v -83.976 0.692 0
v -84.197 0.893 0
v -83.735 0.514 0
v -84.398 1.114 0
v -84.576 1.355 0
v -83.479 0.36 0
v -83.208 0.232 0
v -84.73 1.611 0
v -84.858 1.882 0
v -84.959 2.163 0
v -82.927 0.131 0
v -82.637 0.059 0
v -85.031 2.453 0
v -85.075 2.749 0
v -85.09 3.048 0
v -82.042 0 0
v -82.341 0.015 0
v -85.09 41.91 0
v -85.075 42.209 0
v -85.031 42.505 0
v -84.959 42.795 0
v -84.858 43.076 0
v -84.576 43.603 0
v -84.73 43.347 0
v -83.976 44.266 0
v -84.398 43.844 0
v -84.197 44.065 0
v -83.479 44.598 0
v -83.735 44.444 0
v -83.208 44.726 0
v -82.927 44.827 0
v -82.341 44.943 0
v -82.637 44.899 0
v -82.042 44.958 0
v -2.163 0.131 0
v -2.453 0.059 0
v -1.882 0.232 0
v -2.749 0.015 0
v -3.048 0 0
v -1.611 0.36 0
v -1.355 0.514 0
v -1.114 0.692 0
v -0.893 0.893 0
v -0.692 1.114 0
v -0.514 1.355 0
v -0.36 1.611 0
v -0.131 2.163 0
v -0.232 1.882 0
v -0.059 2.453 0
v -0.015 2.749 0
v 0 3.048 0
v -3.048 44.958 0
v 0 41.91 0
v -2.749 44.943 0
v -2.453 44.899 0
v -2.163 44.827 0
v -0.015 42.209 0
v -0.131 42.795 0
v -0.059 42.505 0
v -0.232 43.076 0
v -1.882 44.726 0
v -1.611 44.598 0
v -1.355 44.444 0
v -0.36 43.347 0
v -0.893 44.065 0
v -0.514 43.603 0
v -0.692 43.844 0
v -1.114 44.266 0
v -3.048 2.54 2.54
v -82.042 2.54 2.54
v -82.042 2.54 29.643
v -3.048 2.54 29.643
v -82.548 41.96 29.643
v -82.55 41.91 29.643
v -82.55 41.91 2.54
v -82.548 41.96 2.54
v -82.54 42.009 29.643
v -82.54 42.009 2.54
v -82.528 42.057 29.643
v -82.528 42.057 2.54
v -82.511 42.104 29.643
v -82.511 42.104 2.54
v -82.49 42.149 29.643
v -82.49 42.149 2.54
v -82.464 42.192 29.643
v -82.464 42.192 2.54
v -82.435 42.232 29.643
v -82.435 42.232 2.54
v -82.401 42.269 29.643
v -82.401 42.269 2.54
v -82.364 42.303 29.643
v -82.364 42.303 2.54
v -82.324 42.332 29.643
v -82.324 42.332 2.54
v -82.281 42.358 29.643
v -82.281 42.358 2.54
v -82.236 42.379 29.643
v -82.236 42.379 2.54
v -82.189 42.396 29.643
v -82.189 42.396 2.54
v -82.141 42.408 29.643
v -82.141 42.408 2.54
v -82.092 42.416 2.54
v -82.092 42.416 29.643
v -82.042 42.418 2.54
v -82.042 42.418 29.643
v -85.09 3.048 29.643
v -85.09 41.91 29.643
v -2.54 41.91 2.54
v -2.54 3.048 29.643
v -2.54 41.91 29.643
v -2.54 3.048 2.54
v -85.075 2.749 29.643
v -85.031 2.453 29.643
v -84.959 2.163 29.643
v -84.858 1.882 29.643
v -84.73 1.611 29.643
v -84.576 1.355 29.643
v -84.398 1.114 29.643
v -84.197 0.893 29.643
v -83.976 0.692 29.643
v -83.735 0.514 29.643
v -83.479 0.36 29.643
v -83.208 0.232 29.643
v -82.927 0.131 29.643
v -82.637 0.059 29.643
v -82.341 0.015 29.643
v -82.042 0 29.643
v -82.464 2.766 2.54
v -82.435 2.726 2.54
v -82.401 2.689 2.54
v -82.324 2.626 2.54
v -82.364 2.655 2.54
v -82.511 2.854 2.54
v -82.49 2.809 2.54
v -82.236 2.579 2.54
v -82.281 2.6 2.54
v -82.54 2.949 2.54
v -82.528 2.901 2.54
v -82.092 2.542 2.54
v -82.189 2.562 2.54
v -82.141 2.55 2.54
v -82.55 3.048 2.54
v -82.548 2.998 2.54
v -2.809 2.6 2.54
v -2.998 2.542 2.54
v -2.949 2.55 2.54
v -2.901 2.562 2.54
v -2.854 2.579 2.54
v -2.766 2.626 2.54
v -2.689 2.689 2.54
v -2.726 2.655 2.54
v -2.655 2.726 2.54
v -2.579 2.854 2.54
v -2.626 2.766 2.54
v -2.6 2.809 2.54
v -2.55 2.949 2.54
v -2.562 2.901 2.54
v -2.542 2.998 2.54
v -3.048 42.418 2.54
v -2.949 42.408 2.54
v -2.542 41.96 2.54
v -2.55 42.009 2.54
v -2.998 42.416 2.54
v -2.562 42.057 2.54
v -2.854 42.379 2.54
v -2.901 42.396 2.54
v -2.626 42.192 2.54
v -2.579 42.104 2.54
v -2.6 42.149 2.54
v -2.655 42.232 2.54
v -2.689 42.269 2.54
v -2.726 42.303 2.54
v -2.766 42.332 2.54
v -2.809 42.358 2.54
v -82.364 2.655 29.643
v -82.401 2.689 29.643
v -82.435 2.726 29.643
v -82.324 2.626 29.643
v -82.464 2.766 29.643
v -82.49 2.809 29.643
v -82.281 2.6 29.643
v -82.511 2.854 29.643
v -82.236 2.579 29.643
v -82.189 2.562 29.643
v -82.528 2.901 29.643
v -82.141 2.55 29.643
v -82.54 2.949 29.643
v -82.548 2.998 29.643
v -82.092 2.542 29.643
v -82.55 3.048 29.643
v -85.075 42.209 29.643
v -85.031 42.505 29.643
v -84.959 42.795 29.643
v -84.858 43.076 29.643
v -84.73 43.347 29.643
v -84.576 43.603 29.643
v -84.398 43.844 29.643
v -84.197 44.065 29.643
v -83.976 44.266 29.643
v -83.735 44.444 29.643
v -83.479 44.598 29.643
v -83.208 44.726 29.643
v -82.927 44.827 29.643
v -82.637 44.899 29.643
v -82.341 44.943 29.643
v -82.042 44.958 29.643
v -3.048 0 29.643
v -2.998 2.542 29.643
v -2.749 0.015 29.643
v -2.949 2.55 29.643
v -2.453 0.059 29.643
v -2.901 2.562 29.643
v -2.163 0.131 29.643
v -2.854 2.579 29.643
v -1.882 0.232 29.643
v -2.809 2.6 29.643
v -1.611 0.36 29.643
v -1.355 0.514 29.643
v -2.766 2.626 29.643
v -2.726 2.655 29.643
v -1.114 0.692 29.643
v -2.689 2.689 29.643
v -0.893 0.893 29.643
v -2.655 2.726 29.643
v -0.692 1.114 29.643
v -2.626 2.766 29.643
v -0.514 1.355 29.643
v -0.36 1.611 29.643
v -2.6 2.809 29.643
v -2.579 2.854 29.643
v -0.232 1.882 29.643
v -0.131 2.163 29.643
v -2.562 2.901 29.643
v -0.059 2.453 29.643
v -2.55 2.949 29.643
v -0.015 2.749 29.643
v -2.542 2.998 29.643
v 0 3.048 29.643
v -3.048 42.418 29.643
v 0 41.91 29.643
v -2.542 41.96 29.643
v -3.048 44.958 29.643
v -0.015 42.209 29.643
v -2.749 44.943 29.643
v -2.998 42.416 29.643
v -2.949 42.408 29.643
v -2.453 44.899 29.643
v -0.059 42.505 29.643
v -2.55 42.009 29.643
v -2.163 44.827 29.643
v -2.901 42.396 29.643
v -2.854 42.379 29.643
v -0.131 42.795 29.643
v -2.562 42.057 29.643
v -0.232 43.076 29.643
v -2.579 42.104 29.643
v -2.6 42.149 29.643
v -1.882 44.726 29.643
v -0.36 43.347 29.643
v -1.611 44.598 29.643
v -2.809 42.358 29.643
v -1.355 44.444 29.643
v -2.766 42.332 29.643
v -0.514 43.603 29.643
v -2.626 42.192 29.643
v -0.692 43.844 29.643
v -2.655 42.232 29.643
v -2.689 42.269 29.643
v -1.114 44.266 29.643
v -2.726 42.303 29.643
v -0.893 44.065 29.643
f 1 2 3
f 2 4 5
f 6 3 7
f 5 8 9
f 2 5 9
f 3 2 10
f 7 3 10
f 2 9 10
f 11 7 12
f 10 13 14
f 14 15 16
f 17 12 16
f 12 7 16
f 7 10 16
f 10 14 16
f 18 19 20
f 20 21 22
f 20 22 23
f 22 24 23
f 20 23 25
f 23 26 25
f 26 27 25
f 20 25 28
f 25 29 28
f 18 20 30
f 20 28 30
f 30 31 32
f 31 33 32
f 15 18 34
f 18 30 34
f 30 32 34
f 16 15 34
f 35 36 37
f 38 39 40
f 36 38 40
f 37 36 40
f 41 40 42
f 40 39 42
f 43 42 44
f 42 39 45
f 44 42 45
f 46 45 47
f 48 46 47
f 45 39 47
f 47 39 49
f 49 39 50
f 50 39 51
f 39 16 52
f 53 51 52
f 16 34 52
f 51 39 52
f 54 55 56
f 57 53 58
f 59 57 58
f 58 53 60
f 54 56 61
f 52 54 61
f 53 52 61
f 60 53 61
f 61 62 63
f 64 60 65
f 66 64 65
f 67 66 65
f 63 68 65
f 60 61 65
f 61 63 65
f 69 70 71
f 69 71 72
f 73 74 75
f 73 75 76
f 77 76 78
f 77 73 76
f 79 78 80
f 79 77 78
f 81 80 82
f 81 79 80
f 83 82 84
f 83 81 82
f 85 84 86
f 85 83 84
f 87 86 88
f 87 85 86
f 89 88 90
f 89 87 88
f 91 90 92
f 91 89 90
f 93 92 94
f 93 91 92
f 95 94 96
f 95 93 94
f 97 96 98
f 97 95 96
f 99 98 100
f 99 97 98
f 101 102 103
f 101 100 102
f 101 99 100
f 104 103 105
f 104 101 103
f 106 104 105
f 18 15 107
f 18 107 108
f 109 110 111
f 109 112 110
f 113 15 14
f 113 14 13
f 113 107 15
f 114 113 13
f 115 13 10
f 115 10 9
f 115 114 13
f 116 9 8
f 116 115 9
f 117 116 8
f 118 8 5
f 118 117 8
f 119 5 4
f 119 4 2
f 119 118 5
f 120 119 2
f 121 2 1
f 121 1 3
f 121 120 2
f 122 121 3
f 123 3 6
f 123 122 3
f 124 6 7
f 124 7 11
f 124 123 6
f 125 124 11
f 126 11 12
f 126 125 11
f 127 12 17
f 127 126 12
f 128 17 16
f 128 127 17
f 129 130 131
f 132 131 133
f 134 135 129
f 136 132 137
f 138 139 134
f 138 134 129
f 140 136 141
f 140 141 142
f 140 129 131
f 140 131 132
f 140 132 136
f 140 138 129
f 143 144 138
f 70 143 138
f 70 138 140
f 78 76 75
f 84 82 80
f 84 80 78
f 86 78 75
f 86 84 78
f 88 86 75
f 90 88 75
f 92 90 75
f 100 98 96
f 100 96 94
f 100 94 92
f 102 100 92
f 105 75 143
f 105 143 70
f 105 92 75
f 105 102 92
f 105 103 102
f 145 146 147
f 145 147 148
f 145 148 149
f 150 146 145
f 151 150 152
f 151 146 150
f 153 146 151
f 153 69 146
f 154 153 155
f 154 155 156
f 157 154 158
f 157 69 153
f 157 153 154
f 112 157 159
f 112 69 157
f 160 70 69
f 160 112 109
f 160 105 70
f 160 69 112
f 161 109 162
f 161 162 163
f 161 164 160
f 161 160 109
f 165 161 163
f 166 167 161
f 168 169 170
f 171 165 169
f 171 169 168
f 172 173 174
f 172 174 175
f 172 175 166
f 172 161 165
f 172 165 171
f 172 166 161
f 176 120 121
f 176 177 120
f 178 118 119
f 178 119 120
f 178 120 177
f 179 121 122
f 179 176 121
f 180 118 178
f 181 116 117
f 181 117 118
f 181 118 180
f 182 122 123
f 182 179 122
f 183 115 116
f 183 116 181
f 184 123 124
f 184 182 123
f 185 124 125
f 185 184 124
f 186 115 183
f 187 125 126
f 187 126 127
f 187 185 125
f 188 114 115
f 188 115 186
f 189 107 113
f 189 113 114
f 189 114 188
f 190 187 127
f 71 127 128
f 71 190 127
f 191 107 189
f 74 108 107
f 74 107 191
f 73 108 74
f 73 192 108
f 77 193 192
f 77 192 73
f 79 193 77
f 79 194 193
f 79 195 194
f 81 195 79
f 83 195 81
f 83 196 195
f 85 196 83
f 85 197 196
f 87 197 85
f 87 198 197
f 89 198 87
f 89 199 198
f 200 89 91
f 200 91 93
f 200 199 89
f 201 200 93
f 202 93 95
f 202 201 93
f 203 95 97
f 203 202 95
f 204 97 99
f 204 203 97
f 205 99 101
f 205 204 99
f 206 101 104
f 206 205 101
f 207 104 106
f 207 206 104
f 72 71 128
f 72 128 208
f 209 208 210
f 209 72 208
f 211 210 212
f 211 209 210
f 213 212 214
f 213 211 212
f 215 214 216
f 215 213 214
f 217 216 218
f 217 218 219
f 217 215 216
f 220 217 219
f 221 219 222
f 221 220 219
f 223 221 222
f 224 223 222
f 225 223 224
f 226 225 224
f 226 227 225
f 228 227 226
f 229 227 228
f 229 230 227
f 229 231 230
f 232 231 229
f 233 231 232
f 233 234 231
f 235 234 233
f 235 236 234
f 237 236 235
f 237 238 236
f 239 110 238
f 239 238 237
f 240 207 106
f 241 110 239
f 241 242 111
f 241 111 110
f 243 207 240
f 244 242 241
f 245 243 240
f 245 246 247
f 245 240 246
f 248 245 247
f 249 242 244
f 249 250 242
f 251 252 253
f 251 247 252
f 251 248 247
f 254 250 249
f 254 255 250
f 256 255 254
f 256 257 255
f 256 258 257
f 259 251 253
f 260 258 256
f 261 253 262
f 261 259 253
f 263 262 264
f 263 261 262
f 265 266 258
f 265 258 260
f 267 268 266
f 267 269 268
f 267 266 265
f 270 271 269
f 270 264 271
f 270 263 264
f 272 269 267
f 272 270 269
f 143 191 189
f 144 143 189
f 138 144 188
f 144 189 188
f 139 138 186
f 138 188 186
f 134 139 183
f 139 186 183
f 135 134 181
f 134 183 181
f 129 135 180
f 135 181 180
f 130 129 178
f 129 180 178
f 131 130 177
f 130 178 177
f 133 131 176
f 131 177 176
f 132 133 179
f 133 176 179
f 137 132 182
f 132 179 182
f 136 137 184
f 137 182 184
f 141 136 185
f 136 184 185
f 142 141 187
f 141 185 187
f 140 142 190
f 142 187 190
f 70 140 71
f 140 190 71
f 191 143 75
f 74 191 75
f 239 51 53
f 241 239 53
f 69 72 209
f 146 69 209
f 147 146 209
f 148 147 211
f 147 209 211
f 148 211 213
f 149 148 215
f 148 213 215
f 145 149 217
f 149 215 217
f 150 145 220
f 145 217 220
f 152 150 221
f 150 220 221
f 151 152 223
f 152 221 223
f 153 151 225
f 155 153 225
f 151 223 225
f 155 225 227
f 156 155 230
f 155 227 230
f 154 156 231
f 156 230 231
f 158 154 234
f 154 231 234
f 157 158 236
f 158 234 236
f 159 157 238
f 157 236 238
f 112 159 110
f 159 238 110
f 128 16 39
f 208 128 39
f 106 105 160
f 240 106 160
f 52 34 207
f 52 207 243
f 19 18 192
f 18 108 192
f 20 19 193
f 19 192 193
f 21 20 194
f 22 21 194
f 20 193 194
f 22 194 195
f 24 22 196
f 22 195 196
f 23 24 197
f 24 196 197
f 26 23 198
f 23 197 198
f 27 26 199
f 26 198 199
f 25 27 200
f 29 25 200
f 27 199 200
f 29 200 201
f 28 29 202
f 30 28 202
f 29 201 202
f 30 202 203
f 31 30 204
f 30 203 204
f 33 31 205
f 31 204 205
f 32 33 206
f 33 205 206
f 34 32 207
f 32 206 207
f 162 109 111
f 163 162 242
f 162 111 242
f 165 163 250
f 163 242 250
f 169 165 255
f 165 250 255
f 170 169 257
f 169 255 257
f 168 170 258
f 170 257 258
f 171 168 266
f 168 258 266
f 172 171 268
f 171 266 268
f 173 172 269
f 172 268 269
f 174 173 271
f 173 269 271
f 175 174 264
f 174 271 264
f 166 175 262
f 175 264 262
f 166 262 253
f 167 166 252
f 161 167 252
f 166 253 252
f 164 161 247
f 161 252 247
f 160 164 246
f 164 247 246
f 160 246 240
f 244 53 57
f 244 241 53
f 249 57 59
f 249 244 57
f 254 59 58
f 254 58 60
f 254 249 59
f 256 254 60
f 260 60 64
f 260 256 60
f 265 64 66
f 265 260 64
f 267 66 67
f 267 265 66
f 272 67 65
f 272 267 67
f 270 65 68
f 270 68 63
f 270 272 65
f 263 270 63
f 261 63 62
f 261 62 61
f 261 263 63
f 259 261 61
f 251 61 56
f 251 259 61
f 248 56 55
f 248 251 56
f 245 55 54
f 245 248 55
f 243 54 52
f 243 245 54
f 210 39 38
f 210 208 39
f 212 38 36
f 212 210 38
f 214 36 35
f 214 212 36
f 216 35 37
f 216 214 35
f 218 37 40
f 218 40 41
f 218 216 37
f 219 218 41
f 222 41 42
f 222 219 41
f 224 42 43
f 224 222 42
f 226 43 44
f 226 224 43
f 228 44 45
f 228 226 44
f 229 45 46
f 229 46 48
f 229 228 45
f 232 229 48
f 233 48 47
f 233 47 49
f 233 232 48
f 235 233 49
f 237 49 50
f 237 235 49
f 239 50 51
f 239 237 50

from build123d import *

# Parameters (mm, degrees)
F0_W     = 85.09
F0_H     = 44.958
F1_DEPTH = 29.6429
F2_R     = 3.048
F3_T     = -2.54


with BuildPart() as f1:
    # F0 (on Top) → F1 (new body)
    with BuildSketch(Plane.XY):
        with Locations((-42.545, 22.479)):
            Rectangle(F0_W, F0_H)
    extrude(amount=F1_DEPTH)

    # F2
    f2_edges = [f1.edges().sort_by_distance(p)[0] for p in [
        (-85.09, 44.958, 14.82145),
        (-85.09, 0, 14.82145),
        (0, 0, 14.82145),
        (0, 44.958, 14.82145),
    ]]
    fillet(f2_edges, radius=F2_R)

    # F3
    f3_openings = [f1.faces().sort_by_distance(p)[0] for p in [
        (-42.545, 22.479, 29.6429),
    ]]
    offset(amount=F3_T, openings=f3_openings)


solid = f1.part
